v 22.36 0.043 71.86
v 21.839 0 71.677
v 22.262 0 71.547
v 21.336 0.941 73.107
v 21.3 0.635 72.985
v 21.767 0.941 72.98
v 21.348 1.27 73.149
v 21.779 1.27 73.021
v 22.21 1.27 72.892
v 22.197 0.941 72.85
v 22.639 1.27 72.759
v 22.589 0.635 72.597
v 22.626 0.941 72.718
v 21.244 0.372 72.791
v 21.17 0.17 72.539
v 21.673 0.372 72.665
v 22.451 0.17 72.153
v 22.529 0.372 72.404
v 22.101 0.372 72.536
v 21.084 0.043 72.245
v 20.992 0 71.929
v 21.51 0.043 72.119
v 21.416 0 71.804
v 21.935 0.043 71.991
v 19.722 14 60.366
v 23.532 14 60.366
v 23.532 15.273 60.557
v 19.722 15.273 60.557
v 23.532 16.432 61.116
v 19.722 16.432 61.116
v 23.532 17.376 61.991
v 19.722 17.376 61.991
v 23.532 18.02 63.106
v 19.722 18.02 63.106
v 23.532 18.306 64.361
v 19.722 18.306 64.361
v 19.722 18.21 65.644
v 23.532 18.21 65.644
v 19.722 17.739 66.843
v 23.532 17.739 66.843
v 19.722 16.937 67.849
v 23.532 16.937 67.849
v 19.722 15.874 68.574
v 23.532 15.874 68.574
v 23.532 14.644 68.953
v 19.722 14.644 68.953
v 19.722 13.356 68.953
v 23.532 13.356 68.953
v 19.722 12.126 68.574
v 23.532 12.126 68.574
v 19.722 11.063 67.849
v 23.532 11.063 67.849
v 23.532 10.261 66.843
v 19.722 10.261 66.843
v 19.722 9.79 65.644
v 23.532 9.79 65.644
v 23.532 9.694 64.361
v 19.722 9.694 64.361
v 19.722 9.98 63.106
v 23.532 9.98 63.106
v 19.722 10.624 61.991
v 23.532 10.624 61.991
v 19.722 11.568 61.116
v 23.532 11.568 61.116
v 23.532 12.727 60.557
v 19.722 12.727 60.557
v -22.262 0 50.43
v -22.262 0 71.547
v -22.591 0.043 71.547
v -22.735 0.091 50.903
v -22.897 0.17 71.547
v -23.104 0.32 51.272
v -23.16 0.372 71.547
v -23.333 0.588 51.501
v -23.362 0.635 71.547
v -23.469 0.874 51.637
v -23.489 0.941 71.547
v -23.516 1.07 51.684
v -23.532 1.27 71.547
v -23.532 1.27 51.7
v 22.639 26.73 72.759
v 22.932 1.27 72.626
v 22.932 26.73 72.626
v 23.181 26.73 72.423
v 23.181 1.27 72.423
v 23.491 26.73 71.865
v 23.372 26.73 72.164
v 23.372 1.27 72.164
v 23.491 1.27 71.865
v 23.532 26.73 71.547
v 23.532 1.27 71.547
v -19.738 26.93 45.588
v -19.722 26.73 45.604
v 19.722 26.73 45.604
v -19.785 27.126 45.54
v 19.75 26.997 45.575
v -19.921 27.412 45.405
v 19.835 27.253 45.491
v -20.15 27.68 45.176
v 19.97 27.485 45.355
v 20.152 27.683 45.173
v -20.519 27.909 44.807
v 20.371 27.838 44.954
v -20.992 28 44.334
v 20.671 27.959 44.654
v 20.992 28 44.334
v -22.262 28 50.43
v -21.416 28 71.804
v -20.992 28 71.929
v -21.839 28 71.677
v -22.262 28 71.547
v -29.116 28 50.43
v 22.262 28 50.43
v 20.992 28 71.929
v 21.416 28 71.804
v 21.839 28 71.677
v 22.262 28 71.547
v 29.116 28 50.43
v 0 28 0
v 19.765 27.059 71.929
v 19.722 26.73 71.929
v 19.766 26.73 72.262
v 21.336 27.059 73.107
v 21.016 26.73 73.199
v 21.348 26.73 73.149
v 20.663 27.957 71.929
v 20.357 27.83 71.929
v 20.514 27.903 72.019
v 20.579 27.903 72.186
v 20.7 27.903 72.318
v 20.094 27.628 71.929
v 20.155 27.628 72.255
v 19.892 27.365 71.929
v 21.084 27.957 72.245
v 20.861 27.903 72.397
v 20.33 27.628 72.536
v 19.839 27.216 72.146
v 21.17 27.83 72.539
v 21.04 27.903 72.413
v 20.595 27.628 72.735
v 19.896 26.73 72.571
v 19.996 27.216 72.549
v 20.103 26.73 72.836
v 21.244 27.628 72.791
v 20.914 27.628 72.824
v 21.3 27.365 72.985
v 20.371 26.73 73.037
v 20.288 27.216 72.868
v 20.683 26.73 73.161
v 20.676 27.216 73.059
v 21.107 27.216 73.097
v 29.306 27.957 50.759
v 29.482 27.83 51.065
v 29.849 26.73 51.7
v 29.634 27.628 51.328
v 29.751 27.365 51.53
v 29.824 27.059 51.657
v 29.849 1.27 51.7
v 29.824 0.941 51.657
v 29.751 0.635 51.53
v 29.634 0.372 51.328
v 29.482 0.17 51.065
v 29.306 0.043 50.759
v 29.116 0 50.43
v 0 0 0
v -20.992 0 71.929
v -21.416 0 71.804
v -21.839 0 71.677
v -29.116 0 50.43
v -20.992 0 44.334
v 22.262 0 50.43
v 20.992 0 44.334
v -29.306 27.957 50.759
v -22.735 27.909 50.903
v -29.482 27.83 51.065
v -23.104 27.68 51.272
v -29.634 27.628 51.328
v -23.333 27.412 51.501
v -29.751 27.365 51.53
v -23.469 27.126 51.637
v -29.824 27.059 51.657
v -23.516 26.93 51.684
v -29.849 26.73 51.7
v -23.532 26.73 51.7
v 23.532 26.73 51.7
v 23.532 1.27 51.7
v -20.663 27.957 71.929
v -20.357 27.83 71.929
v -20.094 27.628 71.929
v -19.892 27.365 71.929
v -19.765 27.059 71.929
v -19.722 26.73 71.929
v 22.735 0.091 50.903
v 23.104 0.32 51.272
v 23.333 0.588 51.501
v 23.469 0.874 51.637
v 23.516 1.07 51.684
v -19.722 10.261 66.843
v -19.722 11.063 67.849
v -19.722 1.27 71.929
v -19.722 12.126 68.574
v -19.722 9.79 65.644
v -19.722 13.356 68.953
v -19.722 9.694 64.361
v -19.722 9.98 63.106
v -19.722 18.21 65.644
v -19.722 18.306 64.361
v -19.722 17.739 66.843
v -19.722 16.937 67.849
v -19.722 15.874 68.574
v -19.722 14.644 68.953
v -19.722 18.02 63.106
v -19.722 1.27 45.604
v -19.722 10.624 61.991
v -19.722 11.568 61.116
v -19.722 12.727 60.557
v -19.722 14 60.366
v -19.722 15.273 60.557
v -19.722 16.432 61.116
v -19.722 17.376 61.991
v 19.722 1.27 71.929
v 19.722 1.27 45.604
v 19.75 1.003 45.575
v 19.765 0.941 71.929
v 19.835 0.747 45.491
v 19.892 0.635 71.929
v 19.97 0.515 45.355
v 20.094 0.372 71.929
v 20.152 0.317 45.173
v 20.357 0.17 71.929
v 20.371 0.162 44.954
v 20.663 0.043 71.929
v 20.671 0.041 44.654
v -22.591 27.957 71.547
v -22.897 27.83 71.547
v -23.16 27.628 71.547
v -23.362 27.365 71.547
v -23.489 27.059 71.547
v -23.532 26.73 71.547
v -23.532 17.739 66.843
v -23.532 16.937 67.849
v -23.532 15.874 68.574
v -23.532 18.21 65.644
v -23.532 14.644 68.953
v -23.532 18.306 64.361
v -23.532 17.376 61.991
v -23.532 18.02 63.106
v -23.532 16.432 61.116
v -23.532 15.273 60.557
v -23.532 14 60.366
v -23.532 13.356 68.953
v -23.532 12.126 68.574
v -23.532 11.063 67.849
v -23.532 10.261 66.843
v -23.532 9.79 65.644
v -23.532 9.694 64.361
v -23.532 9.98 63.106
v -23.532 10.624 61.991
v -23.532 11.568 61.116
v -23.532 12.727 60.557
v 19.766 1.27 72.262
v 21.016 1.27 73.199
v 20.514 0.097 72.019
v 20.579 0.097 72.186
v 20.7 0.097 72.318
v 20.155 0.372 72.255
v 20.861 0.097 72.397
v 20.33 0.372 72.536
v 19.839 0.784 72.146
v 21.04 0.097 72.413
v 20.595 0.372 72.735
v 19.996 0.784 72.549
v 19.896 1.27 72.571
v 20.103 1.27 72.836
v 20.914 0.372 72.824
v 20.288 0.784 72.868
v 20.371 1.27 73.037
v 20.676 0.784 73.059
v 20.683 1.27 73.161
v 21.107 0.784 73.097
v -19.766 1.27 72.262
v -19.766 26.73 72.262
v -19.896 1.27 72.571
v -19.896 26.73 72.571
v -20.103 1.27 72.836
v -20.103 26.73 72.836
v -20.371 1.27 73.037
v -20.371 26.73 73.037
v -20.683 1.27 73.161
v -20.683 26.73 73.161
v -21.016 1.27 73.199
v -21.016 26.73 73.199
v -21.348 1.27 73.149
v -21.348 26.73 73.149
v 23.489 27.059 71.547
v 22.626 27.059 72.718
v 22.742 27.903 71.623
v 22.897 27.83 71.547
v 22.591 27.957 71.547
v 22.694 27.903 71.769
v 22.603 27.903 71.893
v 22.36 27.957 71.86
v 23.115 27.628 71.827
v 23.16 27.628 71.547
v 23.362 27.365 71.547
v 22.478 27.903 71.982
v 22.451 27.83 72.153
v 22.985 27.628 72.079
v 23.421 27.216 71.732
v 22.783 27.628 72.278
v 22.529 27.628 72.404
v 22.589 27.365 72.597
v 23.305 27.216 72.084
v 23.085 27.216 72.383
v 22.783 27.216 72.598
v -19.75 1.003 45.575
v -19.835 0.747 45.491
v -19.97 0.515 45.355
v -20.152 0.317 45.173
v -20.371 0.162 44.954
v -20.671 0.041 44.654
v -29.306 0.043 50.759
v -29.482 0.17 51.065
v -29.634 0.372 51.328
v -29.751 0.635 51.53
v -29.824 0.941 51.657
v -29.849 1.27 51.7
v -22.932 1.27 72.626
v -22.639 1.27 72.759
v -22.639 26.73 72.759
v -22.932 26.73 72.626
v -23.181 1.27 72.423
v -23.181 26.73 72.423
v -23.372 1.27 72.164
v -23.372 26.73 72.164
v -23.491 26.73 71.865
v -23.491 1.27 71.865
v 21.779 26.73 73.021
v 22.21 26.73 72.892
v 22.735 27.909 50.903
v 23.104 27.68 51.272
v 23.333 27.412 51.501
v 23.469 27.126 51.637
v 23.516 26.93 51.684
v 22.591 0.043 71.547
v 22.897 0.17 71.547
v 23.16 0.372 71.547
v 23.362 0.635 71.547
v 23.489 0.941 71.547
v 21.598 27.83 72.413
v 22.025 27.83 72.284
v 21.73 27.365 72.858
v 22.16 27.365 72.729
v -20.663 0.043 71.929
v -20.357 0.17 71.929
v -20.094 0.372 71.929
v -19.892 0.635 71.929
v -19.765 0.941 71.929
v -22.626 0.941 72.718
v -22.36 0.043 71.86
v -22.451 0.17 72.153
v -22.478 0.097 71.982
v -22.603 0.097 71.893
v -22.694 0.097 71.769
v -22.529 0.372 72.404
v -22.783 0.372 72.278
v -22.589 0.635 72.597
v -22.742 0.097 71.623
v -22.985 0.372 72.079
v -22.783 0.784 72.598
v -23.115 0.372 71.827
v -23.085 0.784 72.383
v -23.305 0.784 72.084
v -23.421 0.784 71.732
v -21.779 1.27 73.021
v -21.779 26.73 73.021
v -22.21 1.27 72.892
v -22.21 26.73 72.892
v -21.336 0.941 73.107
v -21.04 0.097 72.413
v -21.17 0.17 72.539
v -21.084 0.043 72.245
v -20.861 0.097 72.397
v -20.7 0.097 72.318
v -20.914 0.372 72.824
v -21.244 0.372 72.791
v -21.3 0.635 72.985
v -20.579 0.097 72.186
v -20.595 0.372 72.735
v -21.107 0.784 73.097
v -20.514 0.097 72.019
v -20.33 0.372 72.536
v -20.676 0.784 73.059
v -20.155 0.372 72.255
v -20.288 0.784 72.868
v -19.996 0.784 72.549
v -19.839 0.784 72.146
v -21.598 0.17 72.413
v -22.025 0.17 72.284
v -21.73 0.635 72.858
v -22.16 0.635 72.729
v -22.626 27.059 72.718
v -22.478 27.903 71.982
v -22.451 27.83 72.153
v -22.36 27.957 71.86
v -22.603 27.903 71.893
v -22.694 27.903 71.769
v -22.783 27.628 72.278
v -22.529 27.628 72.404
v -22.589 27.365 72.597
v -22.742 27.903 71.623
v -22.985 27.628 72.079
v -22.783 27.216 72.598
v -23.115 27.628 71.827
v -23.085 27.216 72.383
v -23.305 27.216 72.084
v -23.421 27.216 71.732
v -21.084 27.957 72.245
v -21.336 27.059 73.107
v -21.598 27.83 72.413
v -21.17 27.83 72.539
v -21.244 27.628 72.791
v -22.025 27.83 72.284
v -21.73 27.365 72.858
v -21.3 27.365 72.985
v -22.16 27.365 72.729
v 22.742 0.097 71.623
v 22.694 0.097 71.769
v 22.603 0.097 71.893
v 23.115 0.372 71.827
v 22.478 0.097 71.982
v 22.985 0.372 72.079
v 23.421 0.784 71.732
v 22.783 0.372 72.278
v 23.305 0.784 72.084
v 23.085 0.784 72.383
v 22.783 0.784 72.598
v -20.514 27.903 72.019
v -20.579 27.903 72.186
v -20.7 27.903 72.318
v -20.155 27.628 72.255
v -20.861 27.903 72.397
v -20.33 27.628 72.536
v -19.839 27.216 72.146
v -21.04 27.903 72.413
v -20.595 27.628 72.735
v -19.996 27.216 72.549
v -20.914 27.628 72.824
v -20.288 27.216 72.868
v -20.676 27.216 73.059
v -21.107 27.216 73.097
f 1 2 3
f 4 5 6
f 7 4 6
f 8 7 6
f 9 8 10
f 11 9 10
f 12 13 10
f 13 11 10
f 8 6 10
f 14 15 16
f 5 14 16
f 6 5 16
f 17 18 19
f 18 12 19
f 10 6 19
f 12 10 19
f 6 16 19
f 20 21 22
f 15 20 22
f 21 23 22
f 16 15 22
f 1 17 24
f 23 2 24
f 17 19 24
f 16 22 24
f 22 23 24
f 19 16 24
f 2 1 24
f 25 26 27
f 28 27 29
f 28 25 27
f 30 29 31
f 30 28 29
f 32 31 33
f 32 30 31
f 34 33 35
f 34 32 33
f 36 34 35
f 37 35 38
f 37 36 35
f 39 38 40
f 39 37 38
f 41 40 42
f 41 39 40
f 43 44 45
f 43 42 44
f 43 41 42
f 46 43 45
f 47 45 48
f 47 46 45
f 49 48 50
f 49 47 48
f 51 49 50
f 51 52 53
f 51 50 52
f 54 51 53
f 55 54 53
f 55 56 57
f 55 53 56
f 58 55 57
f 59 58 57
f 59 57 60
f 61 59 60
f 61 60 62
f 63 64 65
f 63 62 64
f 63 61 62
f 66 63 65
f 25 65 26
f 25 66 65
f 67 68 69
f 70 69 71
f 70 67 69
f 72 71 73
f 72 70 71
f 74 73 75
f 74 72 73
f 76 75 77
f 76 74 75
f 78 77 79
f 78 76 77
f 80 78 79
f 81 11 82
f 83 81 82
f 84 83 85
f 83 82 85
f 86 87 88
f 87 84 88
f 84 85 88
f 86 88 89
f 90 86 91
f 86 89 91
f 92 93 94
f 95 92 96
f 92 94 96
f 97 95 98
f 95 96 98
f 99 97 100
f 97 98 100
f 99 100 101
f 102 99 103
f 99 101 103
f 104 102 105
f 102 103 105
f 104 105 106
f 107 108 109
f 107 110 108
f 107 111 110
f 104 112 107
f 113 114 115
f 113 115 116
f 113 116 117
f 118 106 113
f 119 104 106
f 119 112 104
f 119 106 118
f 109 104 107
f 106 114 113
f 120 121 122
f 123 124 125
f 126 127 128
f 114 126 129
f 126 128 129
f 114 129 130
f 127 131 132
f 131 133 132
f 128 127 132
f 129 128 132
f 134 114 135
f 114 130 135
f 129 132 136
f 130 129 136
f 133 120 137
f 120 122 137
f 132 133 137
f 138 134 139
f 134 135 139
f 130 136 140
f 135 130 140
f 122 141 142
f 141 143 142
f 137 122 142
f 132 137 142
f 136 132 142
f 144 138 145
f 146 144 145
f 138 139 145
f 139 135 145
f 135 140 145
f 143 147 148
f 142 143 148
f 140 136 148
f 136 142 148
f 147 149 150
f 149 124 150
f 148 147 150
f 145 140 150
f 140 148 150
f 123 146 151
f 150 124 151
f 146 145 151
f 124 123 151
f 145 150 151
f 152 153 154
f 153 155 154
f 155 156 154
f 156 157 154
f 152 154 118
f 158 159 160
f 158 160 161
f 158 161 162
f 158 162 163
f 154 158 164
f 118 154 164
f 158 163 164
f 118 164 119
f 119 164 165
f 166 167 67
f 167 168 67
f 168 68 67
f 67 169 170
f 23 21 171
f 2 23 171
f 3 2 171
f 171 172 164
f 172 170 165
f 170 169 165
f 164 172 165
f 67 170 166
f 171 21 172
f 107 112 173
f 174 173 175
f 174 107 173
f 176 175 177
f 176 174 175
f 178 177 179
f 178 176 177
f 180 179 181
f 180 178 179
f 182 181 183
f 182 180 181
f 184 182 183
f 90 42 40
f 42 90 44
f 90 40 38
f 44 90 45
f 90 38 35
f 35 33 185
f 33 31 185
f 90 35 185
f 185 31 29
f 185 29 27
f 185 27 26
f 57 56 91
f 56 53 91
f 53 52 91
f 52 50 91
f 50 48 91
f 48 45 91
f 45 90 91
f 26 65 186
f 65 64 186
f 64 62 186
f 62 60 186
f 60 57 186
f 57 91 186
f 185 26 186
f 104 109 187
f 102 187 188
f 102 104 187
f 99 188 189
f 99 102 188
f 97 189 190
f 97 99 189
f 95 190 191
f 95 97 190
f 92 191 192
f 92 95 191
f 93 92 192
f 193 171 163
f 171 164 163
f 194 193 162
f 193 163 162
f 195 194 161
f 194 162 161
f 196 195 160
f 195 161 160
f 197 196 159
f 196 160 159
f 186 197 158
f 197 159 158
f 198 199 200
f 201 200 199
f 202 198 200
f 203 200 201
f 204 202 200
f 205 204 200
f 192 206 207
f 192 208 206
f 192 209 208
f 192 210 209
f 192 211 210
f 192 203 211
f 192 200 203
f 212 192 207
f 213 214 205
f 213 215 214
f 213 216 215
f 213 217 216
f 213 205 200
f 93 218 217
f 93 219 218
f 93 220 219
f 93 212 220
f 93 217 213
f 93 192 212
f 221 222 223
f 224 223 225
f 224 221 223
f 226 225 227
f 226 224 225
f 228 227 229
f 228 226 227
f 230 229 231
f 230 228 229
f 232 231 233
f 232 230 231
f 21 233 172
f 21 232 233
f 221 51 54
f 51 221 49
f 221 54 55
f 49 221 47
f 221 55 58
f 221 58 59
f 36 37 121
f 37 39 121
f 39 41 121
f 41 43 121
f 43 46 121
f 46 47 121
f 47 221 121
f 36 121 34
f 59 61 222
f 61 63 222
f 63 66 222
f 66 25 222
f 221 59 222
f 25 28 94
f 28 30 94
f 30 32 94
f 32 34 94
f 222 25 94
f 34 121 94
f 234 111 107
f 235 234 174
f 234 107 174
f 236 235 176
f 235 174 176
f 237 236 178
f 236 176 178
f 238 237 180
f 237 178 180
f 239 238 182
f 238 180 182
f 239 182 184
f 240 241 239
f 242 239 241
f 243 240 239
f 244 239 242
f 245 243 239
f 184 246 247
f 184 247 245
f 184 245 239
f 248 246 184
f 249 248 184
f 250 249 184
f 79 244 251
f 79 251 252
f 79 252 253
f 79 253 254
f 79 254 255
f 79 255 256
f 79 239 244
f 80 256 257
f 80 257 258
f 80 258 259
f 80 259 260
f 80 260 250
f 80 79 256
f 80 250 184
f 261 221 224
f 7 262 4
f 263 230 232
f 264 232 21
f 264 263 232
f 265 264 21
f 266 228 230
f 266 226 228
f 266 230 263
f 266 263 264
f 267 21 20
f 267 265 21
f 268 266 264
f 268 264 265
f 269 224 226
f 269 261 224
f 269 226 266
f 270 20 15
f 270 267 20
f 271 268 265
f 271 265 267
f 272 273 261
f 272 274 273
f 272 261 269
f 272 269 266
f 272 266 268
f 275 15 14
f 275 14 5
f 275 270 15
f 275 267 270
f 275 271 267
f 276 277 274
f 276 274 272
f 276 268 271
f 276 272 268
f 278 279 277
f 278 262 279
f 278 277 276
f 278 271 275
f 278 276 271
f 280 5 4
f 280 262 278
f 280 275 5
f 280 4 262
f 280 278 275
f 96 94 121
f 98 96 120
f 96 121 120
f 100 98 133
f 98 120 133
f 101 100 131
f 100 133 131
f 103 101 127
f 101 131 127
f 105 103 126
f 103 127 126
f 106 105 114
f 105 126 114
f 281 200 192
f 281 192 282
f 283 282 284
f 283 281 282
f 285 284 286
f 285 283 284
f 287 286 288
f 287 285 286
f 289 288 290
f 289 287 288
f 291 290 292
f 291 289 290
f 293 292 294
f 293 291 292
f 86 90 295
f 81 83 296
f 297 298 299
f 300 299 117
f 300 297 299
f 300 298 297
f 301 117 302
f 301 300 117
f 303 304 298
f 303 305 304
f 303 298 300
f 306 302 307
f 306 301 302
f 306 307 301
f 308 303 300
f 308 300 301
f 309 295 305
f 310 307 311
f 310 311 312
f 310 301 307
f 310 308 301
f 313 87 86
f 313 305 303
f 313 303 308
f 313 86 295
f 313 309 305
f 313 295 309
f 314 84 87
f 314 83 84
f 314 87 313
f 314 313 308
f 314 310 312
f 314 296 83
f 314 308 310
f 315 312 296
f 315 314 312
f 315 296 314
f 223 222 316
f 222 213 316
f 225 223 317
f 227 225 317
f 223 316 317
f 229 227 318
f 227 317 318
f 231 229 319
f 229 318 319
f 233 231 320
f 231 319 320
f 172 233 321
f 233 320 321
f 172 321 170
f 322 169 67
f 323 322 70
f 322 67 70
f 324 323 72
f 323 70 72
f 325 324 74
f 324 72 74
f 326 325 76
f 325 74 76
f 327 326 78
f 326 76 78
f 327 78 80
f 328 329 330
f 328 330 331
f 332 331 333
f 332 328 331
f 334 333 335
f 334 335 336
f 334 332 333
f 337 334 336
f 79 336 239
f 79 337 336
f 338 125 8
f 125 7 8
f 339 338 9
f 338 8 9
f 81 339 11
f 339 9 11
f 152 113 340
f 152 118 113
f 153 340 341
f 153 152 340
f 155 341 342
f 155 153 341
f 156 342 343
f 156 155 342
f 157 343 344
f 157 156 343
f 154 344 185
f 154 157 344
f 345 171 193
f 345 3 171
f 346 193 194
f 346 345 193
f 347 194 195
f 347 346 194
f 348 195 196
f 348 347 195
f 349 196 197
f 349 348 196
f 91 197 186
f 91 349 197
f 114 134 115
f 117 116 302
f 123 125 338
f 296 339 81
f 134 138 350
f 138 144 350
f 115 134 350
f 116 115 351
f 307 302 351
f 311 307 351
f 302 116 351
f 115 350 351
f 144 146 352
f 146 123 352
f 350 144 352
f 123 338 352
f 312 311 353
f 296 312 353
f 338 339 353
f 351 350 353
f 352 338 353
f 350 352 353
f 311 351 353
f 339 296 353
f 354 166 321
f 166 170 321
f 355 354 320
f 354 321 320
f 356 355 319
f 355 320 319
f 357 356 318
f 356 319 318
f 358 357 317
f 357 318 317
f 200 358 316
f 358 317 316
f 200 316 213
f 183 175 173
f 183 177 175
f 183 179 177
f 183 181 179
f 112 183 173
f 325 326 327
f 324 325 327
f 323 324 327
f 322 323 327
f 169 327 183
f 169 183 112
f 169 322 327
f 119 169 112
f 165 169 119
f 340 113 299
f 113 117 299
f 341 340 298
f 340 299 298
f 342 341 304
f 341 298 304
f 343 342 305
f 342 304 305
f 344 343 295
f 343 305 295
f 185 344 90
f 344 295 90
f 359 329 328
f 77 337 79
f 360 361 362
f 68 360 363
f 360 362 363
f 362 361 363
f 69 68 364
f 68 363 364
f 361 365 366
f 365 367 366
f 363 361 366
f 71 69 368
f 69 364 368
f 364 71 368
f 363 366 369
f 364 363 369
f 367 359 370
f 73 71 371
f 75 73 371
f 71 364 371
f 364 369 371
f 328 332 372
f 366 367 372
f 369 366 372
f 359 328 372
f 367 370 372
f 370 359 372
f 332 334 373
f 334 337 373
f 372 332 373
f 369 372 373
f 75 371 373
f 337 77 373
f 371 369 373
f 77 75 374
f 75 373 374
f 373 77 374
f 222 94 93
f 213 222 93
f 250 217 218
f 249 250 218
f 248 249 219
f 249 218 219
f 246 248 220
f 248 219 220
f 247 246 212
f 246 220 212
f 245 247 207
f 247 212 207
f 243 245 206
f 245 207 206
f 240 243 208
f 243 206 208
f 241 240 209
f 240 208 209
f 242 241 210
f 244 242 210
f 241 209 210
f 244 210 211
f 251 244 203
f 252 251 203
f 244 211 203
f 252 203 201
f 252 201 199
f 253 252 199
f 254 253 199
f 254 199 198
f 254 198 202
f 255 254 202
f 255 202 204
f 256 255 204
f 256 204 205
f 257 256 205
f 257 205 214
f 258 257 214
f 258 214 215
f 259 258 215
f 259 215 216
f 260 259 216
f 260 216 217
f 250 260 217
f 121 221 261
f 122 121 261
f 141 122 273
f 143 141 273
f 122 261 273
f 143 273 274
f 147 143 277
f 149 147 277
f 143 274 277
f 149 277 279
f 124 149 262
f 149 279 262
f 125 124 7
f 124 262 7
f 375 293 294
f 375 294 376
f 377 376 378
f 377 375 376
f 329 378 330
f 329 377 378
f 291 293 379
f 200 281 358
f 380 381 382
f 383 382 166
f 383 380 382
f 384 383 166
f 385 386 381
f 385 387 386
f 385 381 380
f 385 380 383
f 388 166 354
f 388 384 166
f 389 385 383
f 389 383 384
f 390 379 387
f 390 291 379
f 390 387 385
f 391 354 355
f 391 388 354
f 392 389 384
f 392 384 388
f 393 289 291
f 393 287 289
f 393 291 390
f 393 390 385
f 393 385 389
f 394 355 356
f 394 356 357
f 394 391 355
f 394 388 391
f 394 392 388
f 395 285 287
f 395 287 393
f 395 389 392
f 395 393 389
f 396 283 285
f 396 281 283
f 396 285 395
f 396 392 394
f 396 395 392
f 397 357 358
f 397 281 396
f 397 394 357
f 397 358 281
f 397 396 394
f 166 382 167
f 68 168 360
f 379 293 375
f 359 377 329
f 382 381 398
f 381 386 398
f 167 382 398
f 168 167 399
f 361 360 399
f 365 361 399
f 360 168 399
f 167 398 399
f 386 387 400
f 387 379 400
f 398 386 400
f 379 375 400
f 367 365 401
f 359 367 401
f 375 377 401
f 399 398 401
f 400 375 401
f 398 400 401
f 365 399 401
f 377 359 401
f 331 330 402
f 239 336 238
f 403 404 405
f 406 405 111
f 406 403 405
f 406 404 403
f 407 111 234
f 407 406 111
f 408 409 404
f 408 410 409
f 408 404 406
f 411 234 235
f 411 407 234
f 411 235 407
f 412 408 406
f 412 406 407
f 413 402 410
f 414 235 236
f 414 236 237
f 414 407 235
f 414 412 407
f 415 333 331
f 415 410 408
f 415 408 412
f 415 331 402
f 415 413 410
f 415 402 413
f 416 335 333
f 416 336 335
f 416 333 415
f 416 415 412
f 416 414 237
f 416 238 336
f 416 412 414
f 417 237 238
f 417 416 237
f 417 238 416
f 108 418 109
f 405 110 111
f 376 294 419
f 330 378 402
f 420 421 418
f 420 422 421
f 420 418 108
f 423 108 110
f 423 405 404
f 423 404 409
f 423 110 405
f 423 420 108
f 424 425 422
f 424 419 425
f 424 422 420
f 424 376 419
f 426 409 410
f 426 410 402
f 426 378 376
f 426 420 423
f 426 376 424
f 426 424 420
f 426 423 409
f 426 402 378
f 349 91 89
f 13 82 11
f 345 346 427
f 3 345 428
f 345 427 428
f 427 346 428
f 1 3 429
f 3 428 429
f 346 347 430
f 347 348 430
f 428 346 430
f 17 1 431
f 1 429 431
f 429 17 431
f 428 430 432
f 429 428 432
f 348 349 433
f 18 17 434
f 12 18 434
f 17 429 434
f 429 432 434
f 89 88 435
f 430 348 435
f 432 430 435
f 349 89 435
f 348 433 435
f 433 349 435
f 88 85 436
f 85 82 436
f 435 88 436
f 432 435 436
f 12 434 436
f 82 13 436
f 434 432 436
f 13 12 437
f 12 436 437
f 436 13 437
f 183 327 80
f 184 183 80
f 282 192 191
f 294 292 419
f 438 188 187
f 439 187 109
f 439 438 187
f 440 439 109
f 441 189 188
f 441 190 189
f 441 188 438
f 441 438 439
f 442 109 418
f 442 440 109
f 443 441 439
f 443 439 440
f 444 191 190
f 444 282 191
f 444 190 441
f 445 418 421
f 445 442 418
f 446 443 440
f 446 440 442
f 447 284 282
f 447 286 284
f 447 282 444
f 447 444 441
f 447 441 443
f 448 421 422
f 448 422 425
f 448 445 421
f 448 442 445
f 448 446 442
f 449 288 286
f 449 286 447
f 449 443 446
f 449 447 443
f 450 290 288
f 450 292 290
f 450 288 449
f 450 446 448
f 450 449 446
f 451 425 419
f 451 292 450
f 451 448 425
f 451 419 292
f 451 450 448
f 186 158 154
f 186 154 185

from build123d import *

# Parameters (mm, degrees)
BOSS_EXTRUDE1_DEPTH = 28
CUT_EXTRUDE1_DEPTH  = 90.677477663
SKETCH5_R           = 6.35
CUT_EXTRUDE2_DEPTH  = 4.572
SKETCH8_R           = 6.35
SKETCH8_R_2         = 4.318
BOSS_EXTRUDE4_DEPTH = 6.858
CUT_EXTRUDE6_START  = -2.54
SKETCH13_W          = 36.221601717
SKETCH13_H          = 27.797973411
CUT_EXTRUDE6_DEPTH  = 91.021953984
FILLET3_R           = 1.27


with BuildPart() as part:
    # Sketch2 → Boss-Extrude1 (new body)
    with BuildSketch(Plane(origin=(0, 0, 0), x_dir=(1, 0, 0), z_dir=(0, 1, 0))):
        with BuildLine():
            Line((-38.1, -65.991135768), (0, 0))
            Line((0, 0), (0, -76.2))
            ThreePointArc((0, -76.2), (-19.722011237, -73.603547963), (-38.1, -65.991135768))
        make_face()
    boss_extrude1 = extrude(amount=BOSS_EXTRUDE1_DEPTH)

    # Sketch4 → Cut-Extrude1 (cut, symmetric)
    with BuildSketch(Plane(origin=(0, 28, 0), x_dir=(1, 0, 0), z_dir=(0, 1, 0))):
        Polygon((-19.722011237, -73.603547963), (-19.722011237, -45.603553163), (19.722011237, -45.603553163), (19.722011237, -73.603547963), (19.722011237, -89.083413221), (-19.722011237, -89.083413221), align=None)
    cut_extrude1 = extrude(amount=CUT_EXTRUDE1_DEPTH, both=True, mode=Mode.SUBTRACT)

    # Sketch5 → Cut-Extrude2 (cut)
    with BuildSketch(Plane(origin=(-19.722011237, 0, 0), x_dir=(0, 0, -1), z_dir=(1, 0, 0))):
        with Locations((-64.683550563, 14)):
            Circle(SKETCH5_R)
    cut_extrude2 = extrude(amount=-CUT_EXTRUDE2_DEPTH, mode=Mode.SUBTRACT)

    # Sketch8 → Boss-Extrude4 (add)
    with BuildSketch(Plane(origin=(-19.722011237, 0, 0), x_dir=(0, 0, -1), z_dir=(1, 0, 0))):
        with Locations((-64.683550563, 14)):
            Circle(SKETCH8_R)
        with Locations((-64.683550563, 14)):
            Circle(SKETCH8_R_2, mode=Mode.SUBTRACT)
    boss_extrude4 = extrude(amount=-BOSS_EXTRUDE4_DEPTH)

    # Sketch13 → Cut-Extrude6 (cut)
    with BuildSketch(Plane(origin=(0, 0, 0), x_dir=(1, 0, 0), z_dir=(0, 1, 0)).offset(CUT_EXTRUDE6_START)):
        with Locations((-41.642812096, -65.599005435)):
            Rectangle(SKETCH13_W, SKETCH13_H)
    cut_extrude6 = extrude(amount=CUT_EXTRUDE6_DEPTH, mode=Mode.SUBTRACT)

    # Mirror1: Boss-Extrude1, Cut-Extrude1, Cut-Extrude2, Boss-Extrude4, Cut-Extrude6 across plane
    add(boss_extrude1.mirror(Plane(origin=(0, 28, 0), x_dir=(0, 0, 1), z_dir=(-1, 0, 0))))
    add(cut_extrude1.mirror(Plane(origin=(0, 28, 0), x_dir=(0, 0, 1), z_dir=(-1, 0, 0))), mode=Mode.SUBTRACT)
    add(cut_extrude2.mirror(Plane(origin=(0, 28, 0), x_dir=(0, 0, 1), z_dir=(-1, 0, 0))), mode=Mode.SUBTRACT)
    add(boss_extrude4.mirror(Plane(origin=(0, 28, 0), x_dir=(0, 0, 1), z_dir=(-1, 0, 0))))
    add(cut_extrude6.mirror(Plane(origin=(0, 28, 0), x_dir=(0, 0, 1), z_dir=(-1, 0, 0))), mode=Mode.SUBTRACT)

    # Fillet3
    fillet3_edges = [part.edges().sort_by_distance(p)[0] for p in [
        (21.634365977, 28, 73.064315564),
        (21.634365977, 0, 73.064315564),
        (26.690515484, 0, 51.700018729),
        (0, 0, 45.603553163),
        (23.532011237, 14, 72.475405809),
        (23.532011237, 0, 62.087712269),
        (23.532011237, 28, 62.087712269),
        (26.690515484, 28, 51.700018729),
        (-19.722011237, 0, 59.603550563),
        (-19.722011237, 14, 73.603547963),
        (-19.722011237, 28, 59.603550563),
        (0, 28, 45.603553163),
        (-21.634365977, 0, 73.064315564),
        (-26.690515484, 0, 51.700018729),
        (-21.634365977, 28, 73.064315564),
        (-26.690515484, 28, 51.700018729),
        (-23.532011237, 28, 62.087712269),
        (-23.532011237, 0, 62.087712269),
        (-23.532011237, 14, 72.475405809),
        (19.722011237, 14, 73.603547963),
        (19.722011237, 28, 59.603550563),
        (19.722011237, 0, 59.603550563),
    ]]
    fillet(fillet3_edges, radius=FILLET3_R)


solid = part.part
